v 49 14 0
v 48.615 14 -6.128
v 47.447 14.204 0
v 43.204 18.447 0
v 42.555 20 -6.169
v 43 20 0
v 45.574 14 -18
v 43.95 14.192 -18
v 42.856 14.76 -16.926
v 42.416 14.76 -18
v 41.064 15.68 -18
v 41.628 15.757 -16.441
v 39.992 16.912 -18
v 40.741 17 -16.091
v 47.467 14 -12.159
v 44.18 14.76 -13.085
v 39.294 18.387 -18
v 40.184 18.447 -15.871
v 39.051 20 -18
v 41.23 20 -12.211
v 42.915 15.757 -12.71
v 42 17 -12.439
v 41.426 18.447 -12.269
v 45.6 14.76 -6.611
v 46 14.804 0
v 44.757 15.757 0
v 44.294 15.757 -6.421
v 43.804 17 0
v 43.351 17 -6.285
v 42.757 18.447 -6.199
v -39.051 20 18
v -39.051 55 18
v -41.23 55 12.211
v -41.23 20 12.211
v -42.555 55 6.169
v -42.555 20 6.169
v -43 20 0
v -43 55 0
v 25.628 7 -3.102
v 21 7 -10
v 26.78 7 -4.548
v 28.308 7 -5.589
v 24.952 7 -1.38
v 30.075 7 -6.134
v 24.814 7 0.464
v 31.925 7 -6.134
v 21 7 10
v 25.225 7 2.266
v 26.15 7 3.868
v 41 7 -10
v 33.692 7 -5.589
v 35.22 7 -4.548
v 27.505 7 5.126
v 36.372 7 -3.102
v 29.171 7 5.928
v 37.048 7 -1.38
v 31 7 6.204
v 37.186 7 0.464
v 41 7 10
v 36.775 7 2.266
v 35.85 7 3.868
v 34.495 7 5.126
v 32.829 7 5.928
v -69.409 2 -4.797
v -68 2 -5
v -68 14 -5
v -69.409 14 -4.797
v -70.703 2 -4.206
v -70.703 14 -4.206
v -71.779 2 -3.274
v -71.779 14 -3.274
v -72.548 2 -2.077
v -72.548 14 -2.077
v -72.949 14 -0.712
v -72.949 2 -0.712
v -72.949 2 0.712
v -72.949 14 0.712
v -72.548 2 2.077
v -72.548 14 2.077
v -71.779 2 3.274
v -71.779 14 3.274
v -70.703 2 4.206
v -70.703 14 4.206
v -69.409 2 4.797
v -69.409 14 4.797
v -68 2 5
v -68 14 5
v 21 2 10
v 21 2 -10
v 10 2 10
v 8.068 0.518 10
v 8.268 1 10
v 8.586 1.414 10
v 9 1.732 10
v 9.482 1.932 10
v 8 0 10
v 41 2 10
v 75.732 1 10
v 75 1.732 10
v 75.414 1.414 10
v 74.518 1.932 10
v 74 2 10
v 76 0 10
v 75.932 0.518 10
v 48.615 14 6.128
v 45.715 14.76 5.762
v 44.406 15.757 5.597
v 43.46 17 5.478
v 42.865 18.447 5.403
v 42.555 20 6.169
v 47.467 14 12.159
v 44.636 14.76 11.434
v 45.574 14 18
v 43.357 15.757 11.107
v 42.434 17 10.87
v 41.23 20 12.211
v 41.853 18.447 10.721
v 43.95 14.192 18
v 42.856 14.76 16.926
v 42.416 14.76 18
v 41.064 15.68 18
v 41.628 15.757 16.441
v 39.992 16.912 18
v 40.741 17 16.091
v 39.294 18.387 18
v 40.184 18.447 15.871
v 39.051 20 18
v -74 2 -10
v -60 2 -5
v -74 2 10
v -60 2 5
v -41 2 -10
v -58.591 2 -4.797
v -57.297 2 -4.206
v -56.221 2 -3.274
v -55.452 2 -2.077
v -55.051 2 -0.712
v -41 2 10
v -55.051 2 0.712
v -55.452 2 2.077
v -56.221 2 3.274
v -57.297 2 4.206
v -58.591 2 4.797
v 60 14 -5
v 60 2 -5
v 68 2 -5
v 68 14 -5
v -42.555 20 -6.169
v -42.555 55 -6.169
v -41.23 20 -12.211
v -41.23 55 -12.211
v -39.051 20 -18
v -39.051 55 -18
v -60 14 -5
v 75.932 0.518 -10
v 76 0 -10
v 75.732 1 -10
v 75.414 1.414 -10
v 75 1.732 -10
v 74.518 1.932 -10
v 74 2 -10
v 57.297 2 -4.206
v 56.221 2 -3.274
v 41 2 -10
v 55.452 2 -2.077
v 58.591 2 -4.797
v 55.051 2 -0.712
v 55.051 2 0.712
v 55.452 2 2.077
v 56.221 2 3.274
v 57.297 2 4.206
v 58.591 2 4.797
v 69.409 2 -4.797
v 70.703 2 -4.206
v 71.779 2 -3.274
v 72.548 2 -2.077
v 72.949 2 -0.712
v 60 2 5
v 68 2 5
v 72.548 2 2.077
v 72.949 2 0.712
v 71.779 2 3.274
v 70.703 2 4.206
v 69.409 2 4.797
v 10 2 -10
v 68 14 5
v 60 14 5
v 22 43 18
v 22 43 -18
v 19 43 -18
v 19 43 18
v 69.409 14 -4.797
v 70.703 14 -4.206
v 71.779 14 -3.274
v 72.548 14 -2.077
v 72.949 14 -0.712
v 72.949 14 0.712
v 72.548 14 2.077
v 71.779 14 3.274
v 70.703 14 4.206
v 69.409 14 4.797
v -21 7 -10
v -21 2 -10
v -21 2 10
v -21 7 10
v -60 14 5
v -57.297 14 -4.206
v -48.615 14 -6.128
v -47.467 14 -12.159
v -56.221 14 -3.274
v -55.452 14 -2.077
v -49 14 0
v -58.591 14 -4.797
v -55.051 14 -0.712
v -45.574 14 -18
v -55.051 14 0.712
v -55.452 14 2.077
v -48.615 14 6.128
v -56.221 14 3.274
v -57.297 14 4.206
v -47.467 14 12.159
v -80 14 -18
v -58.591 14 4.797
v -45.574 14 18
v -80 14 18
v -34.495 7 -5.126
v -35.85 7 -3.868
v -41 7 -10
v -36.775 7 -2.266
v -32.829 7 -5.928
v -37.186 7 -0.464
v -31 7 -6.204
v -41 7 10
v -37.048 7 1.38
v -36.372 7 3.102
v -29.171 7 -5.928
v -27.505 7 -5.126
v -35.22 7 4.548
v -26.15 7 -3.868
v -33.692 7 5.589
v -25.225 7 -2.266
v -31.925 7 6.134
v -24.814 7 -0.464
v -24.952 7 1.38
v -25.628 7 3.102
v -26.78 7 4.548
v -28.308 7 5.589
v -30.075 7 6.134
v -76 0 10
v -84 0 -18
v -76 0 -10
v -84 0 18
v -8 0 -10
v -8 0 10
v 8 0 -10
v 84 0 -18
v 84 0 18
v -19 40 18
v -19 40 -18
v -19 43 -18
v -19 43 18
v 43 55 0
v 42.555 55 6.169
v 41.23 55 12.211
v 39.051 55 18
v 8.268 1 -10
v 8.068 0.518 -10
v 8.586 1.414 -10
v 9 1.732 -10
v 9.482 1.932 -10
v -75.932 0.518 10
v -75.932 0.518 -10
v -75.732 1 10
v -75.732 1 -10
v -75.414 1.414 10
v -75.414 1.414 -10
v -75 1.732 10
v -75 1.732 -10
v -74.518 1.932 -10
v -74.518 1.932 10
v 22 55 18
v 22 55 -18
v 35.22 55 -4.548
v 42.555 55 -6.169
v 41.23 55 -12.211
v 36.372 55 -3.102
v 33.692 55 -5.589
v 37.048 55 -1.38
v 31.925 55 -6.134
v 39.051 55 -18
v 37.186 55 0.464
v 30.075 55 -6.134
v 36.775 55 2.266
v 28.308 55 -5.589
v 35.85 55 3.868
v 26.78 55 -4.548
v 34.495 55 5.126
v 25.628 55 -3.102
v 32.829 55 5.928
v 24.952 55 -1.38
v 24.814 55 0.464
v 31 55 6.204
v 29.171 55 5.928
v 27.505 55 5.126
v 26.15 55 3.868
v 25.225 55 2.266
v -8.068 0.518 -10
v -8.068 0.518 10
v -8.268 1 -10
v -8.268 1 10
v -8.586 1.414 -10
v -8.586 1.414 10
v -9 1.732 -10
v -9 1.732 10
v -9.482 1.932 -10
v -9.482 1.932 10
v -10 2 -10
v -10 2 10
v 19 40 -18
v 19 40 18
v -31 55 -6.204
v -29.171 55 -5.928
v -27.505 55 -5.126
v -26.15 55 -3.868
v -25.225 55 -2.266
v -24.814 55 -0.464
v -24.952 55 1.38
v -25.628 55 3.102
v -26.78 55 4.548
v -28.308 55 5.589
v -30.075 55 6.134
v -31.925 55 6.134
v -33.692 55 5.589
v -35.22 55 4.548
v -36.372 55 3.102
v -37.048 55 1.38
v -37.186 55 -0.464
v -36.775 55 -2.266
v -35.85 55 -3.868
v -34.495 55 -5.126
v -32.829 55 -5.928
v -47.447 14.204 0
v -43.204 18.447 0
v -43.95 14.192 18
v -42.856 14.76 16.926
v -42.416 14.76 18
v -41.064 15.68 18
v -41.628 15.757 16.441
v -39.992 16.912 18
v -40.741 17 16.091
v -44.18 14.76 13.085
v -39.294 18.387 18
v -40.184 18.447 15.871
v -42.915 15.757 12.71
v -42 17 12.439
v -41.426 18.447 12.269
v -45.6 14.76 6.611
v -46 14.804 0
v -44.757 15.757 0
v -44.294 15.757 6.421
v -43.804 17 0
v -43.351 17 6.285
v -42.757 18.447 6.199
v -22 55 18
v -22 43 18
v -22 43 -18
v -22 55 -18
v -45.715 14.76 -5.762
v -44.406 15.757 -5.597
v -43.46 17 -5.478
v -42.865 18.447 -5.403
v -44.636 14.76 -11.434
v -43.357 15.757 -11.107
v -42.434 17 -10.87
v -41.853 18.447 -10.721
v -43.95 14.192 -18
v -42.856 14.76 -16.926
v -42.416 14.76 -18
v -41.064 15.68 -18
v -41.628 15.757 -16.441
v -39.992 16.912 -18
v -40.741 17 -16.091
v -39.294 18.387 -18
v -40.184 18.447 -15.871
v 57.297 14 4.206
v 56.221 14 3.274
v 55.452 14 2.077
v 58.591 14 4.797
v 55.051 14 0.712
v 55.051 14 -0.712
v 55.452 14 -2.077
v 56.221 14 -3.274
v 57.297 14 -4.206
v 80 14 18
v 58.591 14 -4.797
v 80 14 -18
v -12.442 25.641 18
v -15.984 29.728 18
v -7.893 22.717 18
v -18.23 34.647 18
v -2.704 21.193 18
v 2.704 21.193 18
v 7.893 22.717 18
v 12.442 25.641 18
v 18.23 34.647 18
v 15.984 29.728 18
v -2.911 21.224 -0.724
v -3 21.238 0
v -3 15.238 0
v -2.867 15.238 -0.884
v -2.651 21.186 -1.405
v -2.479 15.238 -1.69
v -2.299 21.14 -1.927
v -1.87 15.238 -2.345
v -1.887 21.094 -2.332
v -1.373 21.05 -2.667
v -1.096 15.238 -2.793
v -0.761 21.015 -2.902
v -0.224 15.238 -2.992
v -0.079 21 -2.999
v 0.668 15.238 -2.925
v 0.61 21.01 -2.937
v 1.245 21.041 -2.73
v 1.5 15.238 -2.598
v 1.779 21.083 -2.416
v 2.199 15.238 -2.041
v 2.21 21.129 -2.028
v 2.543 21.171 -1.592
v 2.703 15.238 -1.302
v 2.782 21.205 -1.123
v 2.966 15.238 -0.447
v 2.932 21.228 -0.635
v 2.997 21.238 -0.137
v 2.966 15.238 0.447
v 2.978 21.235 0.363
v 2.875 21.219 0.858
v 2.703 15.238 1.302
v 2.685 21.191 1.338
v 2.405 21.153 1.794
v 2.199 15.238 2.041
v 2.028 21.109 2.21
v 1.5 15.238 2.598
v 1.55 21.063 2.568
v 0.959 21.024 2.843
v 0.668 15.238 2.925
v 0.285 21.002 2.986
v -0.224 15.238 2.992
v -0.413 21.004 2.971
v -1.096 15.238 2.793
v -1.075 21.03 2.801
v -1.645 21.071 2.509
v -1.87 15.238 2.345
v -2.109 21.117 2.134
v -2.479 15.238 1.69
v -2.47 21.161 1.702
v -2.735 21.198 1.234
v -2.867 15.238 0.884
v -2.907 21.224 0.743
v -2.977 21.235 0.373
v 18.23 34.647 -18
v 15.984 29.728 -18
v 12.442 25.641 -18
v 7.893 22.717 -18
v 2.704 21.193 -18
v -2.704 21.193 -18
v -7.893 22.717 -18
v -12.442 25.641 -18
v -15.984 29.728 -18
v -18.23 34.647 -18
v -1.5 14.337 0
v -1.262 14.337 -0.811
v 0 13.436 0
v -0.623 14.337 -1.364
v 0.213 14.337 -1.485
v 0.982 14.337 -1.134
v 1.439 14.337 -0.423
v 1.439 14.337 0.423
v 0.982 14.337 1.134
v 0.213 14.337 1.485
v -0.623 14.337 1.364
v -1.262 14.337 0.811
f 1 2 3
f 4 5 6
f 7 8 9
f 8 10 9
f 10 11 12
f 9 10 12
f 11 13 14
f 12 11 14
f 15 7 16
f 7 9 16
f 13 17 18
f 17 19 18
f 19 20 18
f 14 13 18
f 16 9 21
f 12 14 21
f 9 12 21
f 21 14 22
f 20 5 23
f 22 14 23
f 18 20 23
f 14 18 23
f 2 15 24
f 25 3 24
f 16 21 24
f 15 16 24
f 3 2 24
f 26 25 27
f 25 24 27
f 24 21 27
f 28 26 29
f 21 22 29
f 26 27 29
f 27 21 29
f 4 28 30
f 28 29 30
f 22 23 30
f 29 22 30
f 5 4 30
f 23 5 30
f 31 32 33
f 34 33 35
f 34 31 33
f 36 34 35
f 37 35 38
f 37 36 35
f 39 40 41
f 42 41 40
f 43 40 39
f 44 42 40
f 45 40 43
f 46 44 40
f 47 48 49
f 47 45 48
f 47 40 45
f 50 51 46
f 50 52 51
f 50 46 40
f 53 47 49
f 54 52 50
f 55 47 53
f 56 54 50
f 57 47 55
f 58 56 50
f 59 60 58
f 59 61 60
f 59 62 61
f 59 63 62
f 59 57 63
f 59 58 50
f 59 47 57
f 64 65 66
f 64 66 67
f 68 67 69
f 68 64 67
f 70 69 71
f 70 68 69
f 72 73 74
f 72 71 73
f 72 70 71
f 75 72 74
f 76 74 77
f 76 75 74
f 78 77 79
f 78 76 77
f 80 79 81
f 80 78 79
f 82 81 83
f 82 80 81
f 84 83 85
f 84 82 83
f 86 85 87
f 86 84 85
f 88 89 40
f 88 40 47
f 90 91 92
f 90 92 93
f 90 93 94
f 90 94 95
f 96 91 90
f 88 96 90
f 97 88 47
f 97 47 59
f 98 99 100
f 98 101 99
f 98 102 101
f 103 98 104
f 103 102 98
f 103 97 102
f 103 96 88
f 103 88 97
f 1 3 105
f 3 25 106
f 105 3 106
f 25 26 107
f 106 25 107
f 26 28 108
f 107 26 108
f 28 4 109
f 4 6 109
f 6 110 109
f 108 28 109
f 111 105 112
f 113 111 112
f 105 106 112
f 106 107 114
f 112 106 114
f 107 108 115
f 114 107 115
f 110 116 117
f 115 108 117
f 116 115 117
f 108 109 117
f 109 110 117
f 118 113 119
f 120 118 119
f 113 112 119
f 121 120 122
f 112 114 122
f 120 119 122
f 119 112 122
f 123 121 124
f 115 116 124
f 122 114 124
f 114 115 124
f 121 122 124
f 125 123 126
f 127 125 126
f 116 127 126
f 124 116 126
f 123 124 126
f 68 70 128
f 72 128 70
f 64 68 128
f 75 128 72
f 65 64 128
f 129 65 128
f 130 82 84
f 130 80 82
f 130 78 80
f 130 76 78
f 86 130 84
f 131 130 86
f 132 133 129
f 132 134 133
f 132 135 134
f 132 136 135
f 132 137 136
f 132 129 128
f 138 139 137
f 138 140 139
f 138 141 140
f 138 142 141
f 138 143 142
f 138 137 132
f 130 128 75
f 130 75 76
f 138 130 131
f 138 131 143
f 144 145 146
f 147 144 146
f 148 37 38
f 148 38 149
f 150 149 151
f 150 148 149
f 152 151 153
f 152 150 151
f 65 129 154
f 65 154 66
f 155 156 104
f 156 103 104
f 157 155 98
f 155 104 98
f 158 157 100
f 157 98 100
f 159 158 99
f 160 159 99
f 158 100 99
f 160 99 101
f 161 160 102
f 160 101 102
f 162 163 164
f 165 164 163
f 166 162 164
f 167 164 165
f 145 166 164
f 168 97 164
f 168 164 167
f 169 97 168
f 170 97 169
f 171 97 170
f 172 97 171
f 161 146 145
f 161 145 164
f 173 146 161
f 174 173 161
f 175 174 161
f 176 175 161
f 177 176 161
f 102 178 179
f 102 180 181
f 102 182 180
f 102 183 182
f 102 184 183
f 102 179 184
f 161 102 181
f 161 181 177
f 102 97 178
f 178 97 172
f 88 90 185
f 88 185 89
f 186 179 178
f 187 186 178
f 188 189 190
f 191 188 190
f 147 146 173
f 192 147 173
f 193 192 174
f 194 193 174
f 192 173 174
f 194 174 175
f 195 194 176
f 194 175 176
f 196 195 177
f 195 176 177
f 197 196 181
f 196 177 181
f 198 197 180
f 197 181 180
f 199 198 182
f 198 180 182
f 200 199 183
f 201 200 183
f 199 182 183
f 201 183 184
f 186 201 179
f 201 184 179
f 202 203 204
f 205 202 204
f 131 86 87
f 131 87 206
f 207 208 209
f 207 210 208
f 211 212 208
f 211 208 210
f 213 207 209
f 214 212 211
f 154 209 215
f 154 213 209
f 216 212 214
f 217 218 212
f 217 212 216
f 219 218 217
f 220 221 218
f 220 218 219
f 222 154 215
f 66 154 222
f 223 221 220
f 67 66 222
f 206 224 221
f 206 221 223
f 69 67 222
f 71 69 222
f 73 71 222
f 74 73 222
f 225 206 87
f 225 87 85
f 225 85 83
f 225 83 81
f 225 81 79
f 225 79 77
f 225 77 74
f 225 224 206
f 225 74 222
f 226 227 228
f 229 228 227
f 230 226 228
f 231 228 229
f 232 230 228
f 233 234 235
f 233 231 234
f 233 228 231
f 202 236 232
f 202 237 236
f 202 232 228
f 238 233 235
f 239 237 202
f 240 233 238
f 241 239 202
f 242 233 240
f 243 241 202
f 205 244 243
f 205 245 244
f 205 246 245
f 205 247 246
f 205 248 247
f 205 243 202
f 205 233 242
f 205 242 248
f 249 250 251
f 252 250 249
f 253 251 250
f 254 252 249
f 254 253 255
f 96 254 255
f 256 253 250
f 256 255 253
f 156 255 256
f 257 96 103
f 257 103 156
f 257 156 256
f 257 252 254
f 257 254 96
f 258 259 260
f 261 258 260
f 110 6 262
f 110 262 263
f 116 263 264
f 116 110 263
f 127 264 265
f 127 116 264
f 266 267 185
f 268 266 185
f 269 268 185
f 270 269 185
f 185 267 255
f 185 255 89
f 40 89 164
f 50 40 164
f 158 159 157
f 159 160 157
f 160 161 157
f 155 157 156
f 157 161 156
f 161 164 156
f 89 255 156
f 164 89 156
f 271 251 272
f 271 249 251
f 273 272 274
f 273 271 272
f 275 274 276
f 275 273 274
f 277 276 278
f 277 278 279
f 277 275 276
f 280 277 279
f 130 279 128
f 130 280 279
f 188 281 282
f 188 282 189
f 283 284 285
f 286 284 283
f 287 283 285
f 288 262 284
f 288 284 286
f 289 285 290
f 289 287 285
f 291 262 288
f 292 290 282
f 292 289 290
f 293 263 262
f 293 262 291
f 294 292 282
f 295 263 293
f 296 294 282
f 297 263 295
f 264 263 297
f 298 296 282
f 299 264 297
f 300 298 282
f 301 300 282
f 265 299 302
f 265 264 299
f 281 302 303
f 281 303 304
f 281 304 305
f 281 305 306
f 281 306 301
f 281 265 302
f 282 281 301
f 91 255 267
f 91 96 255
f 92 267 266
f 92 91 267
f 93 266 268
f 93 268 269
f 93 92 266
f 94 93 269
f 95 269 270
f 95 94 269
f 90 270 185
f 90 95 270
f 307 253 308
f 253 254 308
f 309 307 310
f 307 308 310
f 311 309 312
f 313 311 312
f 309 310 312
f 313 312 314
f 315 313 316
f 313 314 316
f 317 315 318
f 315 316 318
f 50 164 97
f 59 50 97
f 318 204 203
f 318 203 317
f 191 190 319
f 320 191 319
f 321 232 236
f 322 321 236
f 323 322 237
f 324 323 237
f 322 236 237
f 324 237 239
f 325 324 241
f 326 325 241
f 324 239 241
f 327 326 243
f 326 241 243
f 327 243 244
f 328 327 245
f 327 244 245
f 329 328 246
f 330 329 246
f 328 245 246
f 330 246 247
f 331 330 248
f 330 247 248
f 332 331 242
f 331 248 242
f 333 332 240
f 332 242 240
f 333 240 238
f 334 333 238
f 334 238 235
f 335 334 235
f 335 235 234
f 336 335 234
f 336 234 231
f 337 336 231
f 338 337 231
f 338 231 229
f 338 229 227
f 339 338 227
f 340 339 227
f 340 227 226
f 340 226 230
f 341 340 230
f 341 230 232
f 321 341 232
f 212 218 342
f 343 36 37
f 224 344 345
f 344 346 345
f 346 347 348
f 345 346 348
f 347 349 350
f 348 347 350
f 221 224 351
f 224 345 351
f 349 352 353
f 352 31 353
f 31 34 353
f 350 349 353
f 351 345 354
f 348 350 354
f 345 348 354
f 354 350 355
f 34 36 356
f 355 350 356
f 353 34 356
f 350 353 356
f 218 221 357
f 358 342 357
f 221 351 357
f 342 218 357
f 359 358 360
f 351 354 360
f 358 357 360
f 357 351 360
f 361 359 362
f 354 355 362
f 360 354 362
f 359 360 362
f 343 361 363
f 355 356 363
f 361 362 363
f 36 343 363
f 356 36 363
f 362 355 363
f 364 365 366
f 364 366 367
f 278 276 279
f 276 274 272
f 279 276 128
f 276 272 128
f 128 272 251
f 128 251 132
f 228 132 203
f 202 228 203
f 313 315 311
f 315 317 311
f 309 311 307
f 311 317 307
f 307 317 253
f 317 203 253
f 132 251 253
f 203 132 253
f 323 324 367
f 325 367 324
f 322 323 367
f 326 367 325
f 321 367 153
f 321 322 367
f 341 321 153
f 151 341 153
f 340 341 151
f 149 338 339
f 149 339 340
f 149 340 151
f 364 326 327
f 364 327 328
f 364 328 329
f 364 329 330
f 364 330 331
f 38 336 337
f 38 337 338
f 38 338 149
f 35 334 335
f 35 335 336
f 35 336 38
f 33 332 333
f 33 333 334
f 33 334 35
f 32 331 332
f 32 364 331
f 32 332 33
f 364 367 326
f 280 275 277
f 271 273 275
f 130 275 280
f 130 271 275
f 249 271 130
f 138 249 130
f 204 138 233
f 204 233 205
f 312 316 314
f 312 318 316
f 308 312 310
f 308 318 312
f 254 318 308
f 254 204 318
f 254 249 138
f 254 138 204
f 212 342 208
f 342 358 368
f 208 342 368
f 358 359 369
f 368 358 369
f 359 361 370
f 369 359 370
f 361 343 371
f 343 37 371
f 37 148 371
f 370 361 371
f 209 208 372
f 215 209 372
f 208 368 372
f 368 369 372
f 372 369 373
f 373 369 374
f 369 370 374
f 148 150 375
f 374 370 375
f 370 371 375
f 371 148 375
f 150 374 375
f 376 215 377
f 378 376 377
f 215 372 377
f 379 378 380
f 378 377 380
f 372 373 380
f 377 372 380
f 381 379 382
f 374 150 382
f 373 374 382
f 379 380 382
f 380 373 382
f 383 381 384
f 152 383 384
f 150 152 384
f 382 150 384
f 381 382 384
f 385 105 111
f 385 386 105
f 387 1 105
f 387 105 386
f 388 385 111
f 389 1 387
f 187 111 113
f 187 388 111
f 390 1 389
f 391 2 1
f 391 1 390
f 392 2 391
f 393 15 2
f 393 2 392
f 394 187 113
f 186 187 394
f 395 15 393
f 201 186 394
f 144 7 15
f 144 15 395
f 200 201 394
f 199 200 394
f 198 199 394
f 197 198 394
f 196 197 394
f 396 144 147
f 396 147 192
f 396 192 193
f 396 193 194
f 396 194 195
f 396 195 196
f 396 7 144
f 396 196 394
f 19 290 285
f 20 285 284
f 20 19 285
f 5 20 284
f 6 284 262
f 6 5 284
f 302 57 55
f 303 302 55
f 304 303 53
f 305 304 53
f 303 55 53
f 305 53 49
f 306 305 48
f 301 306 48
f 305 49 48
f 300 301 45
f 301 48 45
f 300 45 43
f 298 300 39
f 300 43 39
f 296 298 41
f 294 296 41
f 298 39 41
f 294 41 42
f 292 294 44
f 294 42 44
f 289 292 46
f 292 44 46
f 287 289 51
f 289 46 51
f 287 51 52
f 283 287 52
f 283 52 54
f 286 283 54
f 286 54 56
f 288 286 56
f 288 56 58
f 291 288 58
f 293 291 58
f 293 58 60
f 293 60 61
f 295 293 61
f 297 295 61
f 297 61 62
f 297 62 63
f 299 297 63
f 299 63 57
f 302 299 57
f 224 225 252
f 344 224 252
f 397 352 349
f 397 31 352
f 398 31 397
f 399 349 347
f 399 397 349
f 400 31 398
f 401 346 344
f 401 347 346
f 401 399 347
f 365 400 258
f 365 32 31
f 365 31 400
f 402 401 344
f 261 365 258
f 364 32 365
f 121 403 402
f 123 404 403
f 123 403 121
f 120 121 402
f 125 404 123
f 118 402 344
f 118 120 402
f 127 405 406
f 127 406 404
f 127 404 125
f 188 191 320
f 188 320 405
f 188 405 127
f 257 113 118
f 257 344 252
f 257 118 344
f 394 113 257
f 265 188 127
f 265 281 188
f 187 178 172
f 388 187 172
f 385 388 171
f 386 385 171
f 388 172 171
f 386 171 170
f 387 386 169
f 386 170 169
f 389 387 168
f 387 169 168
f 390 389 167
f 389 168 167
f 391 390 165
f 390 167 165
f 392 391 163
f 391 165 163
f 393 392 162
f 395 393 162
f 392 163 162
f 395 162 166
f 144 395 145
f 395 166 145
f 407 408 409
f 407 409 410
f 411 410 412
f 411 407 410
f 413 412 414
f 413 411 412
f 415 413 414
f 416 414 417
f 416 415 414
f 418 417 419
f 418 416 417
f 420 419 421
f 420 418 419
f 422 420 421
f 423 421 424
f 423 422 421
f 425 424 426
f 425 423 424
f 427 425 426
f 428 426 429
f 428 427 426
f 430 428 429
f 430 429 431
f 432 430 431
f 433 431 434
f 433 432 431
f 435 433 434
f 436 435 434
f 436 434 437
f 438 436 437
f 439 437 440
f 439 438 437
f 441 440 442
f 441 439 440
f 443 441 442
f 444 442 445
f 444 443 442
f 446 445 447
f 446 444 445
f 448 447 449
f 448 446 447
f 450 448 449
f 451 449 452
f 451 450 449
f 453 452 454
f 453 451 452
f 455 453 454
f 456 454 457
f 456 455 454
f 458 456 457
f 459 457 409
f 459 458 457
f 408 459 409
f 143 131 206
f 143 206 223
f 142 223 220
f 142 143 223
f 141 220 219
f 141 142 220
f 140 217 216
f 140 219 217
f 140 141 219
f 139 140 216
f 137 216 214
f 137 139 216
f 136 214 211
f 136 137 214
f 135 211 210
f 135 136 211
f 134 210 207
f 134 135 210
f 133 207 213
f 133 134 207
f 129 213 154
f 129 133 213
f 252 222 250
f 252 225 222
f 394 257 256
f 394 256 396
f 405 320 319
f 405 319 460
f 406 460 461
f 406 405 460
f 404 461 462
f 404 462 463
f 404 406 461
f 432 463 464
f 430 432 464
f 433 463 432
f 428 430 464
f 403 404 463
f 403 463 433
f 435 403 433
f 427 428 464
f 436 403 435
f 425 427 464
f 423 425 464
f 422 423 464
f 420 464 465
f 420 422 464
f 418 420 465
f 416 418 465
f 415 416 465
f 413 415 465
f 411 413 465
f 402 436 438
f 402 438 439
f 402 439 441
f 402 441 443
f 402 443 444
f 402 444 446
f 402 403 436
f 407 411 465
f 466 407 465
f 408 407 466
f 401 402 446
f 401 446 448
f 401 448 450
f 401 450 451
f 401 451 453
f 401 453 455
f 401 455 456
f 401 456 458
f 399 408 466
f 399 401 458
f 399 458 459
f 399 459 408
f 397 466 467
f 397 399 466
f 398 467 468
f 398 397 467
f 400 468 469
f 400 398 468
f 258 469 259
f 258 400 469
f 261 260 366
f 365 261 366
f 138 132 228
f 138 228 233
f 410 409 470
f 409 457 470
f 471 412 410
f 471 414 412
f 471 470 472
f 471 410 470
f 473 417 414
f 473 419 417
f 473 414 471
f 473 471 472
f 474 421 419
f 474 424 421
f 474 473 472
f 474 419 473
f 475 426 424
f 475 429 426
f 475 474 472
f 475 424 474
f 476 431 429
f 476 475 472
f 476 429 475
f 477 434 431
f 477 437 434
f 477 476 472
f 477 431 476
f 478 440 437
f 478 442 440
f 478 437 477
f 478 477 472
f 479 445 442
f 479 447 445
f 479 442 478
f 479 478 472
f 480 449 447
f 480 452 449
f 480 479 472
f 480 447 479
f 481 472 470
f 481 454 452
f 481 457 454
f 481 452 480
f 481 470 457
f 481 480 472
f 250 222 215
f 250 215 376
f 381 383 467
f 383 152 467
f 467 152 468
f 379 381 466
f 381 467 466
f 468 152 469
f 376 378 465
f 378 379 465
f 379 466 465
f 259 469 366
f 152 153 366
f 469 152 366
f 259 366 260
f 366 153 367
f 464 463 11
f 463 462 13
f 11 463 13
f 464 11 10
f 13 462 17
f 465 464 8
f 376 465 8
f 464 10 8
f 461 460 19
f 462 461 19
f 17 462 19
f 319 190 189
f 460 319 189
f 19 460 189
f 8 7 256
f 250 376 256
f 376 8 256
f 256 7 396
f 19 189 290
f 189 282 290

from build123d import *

# Parameters (mm, degrees)
BOSS_EXTRUDE1_DEPTH = 18
SKETCH2_W           = 68
SKETCH2_H           = 20
CUT_EXTRUDE1_DEPTH  = 2
FILLET1_R           = 2
SKETCH3_W           = 20
SKETCH3_H           = 20
CUT_EXTRUDE4_DEPTH  = 7
SKETCH6_R           = 6.203606153
CUT_EXTRUDE5_DEPTH  = 103.004901843
CUT_EXTRUDE6_START  = -41
CUT_EXTRUDE6_DEPTH  = 41
FILLET2_R           = 6


# Read off the part's stored shape, not the designer's step: Cut-Extrude6
with BuildPart() as part:
    # Sketch1 → Boss-Extrude1 (new, symmetric)
    with BuildSketch(Plane.XY):
        with BuildLine():
            Line((-84, 0), (84, 0))
            Line((84, 0), (80, 14))
            Line((80, 14), (43, 14))
            Line((43, 14), (43, 55))
            Line((43, 55), (22, 55))
            Line((22, 55), (22, 43))
            Line((22, 43), (19, 43))
            Line((19, 43), (19, 40))
            ThreePointArc((19, 40), (0, 21), (-19, 40))
            Line((-19, 40), (-19, 43))
            Line((-19, 43), (-22, 43))
            Line((-22, 43), (-22, 55))
            Line((-22, 55), (-43, 55))
            Line((-43, 55), (-43, 14))
            Line((-43, 14), (-80, 14))
            Line((-80, 14), (-84, 0))
        make_face()
    extrude(amount=BOSS_EXTRUDE1_DEPTH, both=True)

    # Sketch2 → Cut-Extrude1 (cut)
    with BuildSketch(Plane.XZ):
        with Locations((-42, 0)):
            Rectangle(SKETCH2_W, SKETCH2_H)
        with Locations((42, 0)):
            Rectangle(SKETCH2_W, SKETCH2_H)
    extrude(amount=-CUT_EXTRUDE1_DEPTH, mode=Mode.SUBTRACT)

    # Fillet1
    fillet1_edges = [part.edges().sort_by_distance(p)[0] for p in [
        (76, 2, 0),
        (8, 2, 0),
        (-8, 2, 0),
        (-76, 2, 0),
    ]]
    fillet(fillet1_edges, radius=FILLET1_R - 0.0001)  # a hair under: the kernel refuses the full size

    # Sketch3 → Cut-Extrude4 (cut)
    with BuildSketch(Plane.XZ):
        with Locations((-31, 0)):
            Rectangle(SKETCH3_W, SKETCH3_H)
        with Locations((31, 0)):
            Rectangle(SKETCH3_W, SKETCH3_H)
    extrude(amount=-CUT_EXTRUDE4_DEPTH, mode=Mode.SUBTRACT)

    # Sketch6 → Cut-Extrude5 (cut, through all)
    with BuildSketch(Plane.XZ):
        with Locations(Location((-31, 0, 0), (0, 0, 270))):
            Circle(SKETCH6_R)
        with Locations(Location((31, 0, 0), (0, 0, 90))):
            Circle(SKETCH6_R)
        with BuildLine():
            Line((-68, 5), (-60, 5))
            ThreePointArc((-60, 5), (-55, 0), (-60, -5))
            Line((-60, -5), (-68, -5))
            ThreePointArc((-68, -5), (-73, 0), (-68, 5))
        make_face()
        with BuildLine():
            Line((68, 5), (60, 5))
            ThreePointArc((60, 5), (55, 0), (60, -5))
            Line((60, -5), (68, -5))
            ThreePointArc((68, -5), (73, 0), (68, 5))
        make_face()
    extrude(amount=-CUT_EXTRUDE5_DEPTH, mode=Mode.SUBTRACT)

    # Cut-Extrude6 outline → Cut-Extrude6 (cut)
    with BuildSketch(Plane(origin=(0, 55, 0), x_dir=(1, 0, 0), z_dir=(0, 1, 0)).offset(CUT_EXTRUDE6_START)):
        with BuildLine():
            ThreePointArc((43, 0), (42.001212365, -9.214019744), (39.05124838, -18))
            Line((39.05124838, -18), (43, -18))
            Line((43, -18), (43, 0))
        make_face()
        with BuildLine():
            ThreePointArc((39.05124838, 18), (42.001212365, 9.214019744), (43, 0))
            Line((43, 0), (43, 18))
            Line((43, 18), (39.05124838, 18))
        make_face()
        with BuildLine():
            Line((-43, -18), (-39.05124838, -18))
            ThreePointArc((-39.05124838, -18), (-42.001212365, -9.214019744), (-43, 0))
            Line((-43, 0), (-43, -18))
        make_face()
        with BuildLine():
            Line((-43, 18), (-43, 0))
            ThreePointArc((-43, 0), (-42.001212365, 9.214019744), (-39.05124838, 18))
            Line((-39.05124838, 18), (-43, 18))
        make_face()
    extrude(amount=CUT_EXTRUDE6_DEPTH, mode=Mode.SUBTRACT)

    # Fillet2
    fillet2_edges = [part.edges().sort_by_distance(p)[0] for p in [
        (42.001212365, 14, -9.214019744),
        (-42.001212365, 14, 9.214019744),
    ]]
    fillet(fillet2_edges, radius=FILLET2_R)

    # Sketch8 → Cut-Revolve1 (revolve, cut)
    with BuildSketch(Plane.XY, mode=Mode.PRIVATE) as cut_revolve1_sk:
        Polygon((0, 21), (0, 13.435755104), (3, 15.238336961), (3, 21.238336961), align=None)
    revolve(cut_revolve1_sk.sketch.rotate(Axis((0, 21, 0), (0, -1, 0)), 180), axis=Axis((0, 21, 0), (0, -1, 0)), mode=Mode.SUBTRACT)


solid = part.part
